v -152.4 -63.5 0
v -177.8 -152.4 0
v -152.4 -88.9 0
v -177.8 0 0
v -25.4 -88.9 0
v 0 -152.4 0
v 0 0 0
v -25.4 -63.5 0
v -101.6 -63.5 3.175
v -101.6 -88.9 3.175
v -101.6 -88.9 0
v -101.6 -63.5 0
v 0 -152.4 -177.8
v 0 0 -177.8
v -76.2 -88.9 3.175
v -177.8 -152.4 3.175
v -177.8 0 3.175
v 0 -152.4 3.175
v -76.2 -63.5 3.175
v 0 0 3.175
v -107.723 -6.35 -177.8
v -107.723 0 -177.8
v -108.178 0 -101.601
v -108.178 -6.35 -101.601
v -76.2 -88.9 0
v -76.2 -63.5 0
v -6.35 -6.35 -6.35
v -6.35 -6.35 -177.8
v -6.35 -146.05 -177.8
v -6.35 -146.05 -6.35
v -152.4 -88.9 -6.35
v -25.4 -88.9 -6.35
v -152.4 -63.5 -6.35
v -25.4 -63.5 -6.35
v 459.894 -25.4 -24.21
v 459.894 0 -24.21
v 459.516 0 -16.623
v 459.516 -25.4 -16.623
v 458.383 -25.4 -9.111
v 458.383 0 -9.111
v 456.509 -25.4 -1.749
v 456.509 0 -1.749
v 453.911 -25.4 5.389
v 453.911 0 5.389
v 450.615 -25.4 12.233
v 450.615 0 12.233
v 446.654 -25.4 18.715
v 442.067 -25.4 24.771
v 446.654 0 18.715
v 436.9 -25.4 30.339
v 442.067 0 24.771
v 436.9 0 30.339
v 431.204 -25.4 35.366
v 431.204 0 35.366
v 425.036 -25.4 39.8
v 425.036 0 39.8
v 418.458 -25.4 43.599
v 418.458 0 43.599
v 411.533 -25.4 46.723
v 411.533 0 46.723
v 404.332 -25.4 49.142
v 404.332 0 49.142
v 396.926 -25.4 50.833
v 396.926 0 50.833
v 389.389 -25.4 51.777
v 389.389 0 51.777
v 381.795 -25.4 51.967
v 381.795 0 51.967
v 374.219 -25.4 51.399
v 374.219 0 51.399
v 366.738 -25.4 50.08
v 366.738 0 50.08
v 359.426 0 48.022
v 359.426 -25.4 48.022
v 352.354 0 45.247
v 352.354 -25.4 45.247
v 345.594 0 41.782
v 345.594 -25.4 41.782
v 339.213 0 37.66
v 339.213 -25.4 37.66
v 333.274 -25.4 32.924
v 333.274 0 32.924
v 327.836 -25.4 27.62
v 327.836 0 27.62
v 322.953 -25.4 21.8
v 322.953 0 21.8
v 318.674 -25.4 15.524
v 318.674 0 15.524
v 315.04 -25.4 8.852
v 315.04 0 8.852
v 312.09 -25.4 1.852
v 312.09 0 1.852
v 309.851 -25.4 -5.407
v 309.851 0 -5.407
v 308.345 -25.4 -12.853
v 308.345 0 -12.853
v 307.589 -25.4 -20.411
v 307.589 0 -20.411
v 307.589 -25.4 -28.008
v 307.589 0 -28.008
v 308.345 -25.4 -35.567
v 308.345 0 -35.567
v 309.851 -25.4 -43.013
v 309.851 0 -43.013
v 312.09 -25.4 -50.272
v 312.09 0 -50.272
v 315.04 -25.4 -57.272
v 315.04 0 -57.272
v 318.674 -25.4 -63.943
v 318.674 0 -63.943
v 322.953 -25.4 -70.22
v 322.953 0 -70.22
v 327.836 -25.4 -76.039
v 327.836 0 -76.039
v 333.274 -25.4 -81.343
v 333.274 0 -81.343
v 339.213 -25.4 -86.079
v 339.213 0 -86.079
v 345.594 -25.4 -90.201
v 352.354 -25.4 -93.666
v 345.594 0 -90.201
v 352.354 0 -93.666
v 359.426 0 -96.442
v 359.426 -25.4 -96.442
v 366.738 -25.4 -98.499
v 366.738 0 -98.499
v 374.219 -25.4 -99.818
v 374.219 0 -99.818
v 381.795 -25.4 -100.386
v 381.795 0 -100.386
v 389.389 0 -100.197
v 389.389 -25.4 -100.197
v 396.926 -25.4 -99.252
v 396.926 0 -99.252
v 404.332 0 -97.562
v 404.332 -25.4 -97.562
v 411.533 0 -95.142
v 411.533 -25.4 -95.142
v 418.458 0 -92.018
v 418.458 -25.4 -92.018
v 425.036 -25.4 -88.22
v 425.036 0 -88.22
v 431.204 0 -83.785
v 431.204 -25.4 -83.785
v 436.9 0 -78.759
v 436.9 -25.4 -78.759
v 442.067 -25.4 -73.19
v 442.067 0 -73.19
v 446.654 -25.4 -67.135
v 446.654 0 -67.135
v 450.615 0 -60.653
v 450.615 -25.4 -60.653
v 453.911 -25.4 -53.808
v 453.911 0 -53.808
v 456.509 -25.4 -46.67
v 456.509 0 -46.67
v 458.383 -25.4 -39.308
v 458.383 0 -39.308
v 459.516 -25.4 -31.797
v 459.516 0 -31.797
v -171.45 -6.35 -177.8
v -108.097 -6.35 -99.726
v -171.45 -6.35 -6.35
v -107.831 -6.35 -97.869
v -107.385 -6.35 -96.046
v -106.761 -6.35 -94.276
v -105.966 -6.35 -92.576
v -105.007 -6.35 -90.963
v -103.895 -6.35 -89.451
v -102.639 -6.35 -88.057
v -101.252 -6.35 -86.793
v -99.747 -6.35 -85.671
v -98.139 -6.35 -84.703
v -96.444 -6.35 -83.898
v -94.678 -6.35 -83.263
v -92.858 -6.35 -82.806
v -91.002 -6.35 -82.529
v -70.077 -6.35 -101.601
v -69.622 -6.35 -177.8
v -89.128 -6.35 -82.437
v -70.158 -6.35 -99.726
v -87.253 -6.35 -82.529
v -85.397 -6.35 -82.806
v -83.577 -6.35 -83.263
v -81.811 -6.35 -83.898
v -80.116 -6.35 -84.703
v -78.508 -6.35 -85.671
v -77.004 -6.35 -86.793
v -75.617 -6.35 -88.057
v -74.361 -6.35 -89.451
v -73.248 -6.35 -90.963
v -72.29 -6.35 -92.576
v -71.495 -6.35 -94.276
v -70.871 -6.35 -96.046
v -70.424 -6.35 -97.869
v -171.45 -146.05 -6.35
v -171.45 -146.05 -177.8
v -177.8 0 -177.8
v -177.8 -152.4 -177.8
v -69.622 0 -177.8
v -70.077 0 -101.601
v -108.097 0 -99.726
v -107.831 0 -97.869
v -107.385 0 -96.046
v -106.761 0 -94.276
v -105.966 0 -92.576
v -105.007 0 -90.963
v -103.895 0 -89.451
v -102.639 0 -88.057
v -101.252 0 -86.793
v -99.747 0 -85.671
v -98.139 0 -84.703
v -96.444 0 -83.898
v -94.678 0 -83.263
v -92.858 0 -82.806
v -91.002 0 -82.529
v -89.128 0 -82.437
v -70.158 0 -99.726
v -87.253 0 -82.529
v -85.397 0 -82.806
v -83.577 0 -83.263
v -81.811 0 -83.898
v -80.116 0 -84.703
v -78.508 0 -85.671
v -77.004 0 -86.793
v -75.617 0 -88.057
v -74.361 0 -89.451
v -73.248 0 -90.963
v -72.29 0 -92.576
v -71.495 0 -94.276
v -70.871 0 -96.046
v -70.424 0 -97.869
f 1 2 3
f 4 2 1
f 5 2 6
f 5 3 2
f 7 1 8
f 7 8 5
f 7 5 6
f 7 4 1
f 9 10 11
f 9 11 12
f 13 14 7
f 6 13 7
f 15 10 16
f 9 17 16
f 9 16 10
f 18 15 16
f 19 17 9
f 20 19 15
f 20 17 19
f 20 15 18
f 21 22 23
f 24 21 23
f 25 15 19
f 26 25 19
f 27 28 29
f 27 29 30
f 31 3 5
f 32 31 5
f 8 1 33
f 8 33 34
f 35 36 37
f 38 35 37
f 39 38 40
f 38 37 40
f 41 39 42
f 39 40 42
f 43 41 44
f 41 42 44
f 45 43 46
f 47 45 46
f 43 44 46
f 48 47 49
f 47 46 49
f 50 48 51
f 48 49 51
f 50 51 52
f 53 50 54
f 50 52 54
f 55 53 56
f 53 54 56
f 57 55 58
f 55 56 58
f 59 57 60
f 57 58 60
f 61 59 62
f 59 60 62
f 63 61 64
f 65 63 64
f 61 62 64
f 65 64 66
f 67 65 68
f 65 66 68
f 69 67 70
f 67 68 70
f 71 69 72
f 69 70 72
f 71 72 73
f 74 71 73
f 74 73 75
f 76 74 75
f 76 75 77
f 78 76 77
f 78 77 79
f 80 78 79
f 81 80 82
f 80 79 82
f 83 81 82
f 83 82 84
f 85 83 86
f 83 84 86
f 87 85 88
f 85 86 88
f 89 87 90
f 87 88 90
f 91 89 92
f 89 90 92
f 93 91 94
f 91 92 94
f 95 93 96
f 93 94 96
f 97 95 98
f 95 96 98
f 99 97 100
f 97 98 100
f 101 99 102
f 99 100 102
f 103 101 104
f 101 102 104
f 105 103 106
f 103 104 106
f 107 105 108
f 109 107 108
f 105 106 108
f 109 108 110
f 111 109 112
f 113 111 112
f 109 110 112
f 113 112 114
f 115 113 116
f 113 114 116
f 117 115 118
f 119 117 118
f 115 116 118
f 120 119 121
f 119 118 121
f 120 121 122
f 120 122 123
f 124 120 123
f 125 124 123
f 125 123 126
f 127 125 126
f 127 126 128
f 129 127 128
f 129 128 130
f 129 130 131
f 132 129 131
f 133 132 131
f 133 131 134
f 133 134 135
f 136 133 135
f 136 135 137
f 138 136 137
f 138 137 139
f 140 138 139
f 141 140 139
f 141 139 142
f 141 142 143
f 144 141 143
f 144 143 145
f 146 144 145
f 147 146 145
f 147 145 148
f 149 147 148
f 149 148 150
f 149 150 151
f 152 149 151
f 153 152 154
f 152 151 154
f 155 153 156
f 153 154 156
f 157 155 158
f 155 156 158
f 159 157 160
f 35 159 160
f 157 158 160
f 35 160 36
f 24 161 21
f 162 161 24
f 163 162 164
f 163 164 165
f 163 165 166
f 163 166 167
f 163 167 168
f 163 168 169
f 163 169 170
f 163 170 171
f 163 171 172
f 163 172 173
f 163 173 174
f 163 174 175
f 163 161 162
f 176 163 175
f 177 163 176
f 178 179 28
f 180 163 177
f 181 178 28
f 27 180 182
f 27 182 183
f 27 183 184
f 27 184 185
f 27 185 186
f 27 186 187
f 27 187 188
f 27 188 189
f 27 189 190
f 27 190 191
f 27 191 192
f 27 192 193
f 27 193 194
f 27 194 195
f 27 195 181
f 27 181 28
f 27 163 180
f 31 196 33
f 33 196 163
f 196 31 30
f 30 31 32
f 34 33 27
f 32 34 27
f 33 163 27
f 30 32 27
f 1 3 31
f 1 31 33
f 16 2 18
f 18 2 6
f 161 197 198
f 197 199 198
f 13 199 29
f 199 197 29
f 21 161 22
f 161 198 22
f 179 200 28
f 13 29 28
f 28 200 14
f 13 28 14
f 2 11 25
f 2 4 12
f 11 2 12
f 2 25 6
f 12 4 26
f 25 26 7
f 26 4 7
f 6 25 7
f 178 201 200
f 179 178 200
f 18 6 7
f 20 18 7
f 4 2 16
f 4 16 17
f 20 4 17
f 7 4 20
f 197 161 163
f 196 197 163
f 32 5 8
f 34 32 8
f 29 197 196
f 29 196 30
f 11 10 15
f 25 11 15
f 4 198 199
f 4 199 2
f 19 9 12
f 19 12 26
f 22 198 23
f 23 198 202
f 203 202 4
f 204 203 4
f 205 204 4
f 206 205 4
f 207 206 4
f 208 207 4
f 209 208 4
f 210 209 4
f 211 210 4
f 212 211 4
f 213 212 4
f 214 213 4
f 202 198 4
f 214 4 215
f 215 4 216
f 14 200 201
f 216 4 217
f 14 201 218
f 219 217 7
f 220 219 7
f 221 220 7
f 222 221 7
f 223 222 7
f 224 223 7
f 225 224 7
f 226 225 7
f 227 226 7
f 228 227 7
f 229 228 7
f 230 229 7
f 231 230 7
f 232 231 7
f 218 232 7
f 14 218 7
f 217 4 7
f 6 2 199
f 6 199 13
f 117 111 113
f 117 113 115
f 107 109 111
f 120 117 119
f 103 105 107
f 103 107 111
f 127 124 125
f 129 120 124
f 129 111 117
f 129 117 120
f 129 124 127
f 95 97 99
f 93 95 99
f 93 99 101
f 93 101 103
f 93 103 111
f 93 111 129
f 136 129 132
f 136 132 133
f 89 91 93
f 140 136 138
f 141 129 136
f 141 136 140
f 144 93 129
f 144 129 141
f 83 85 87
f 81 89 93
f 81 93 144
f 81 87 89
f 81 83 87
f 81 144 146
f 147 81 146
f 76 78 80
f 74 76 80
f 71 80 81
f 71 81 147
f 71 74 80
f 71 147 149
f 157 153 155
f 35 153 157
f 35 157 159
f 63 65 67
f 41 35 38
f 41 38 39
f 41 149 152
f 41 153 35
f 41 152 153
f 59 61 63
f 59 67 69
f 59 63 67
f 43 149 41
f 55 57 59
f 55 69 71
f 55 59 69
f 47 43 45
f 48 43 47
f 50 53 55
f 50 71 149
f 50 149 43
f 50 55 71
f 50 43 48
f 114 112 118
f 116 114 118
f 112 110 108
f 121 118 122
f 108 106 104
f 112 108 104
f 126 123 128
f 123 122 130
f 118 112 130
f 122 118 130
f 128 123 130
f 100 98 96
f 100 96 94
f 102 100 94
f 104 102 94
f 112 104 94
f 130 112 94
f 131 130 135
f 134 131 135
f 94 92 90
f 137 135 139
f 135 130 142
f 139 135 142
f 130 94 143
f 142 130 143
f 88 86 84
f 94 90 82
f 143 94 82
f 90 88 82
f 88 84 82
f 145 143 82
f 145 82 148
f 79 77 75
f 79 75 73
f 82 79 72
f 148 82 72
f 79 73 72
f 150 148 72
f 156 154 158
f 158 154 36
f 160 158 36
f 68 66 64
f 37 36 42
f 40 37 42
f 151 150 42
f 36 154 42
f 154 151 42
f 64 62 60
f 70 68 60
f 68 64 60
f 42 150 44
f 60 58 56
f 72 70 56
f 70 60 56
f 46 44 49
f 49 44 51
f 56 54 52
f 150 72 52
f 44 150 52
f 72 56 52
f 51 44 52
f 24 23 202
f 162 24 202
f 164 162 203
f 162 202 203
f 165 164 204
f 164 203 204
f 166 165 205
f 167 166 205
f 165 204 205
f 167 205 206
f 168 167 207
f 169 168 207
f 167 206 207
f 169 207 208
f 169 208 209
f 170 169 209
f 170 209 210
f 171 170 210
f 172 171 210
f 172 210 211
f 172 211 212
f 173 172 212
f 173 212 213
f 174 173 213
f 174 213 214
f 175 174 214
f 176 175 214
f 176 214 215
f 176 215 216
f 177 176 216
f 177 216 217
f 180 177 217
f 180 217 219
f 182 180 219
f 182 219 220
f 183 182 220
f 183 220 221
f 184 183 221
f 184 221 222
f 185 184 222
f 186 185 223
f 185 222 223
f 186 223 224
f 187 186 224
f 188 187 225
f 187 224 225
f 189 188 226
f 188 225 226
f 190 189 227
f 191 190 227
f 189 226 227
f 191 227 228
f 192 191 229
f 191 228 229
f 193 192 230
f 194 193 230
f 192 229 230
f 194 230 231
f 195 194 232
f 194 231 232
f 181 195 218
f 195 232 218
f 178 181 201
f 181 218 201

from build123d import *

# Parameters (mm, degrees)
F0_W      = 177.8
F0_H      = 177.8
F1_DEPTH  = 152.4
F2_T      = -6.35
F4_DEPTH  = 25.4
F5_R      = 76.2
F6_DEPTH  = 25.4
F7_W      = 127
F7_H      = 25.4
F8_DEPTH  = 25.4
F9_W      = 177.8
F9_H      = 152.4
F10_DEPTH = 3.175
F11_W     = 25.4
F11_H     = 25.4
F12_DEPTH = 25.4


with BuildPart() as f1:
    # F0 (on Front) → F1 (new body)
    with BuildSketch(Plane.XZ):
        with Locations((-88.9, -88.9)):
            Rectangle(F0_W, F0_H)
    extrude(amount=F1_DEPTH)

    # F2
    f2_openings = [f1.faces().sort_by_distance(p)[0] for p in [
        (-88.9, -76.2, -177.8),
    ]]
    offset(amount=F2_T, openings=f2_openings)

    # F3 (on face) → F4 (cut)
    with BuildSketch(Plane(origin=(0, 0, 0), x_dir=(-1, 0, 0), z_dir=(0, 1, 0))):
        with BuildLine():
            Line((70.077266, -101.60136), (69.622054, -177.8))
            Line((69.622054, -177.8), (107.722734, -177.8))
            Line((107.722734, -177.8), (108.177946, -101.60136))
            ThreePointArc((108.177946, -101.60136), (89.127606, -82.436873), (70.077266, -101.60136))
        make_face()
    extrude(amount=-F4_DEPTH, mode=Mode.SUBTRACT)

    # F7 (on face) → F8 (cut)
    with BuildSketch(Plane.XY):
        with Locations((-88.9, -76.2)):
            Rectangle(F7_W, F7_H)
    extrude(amount=-F8_DEPTH, mode=Mode.SUBTRACT)


with BuildPart() as f6:
    # F5 (on Front) → F6 (new body)
    with BuildSketch(Plane.XZ):
        with Locations((383.694321, -24.209617)):
            Circle(F5_R)
    extrude(amount=F6_DEPTH)


with BuildPart() as f10:
    # F9 (on face) → F10 (new body)
    with BuildSketch(Plane.XY):
        with Locations((-88.9, -76.2)):
            Rectangle(F9_W, F9_H)
    extrude(amount=F10_DEPTH)

    # F11 (on face) → F12 (cut)
    with BuildSketch(Plane.XY.offset(3.175)):
        with Locations((-88.9, -76.2)):
            Rectangle(F11_W, F11_H)
    extrude(amount=-F12_DEPTH, mode=Mode.SUBTRACT)


solid = Compound([f1.part, f6.part, f10.part])
